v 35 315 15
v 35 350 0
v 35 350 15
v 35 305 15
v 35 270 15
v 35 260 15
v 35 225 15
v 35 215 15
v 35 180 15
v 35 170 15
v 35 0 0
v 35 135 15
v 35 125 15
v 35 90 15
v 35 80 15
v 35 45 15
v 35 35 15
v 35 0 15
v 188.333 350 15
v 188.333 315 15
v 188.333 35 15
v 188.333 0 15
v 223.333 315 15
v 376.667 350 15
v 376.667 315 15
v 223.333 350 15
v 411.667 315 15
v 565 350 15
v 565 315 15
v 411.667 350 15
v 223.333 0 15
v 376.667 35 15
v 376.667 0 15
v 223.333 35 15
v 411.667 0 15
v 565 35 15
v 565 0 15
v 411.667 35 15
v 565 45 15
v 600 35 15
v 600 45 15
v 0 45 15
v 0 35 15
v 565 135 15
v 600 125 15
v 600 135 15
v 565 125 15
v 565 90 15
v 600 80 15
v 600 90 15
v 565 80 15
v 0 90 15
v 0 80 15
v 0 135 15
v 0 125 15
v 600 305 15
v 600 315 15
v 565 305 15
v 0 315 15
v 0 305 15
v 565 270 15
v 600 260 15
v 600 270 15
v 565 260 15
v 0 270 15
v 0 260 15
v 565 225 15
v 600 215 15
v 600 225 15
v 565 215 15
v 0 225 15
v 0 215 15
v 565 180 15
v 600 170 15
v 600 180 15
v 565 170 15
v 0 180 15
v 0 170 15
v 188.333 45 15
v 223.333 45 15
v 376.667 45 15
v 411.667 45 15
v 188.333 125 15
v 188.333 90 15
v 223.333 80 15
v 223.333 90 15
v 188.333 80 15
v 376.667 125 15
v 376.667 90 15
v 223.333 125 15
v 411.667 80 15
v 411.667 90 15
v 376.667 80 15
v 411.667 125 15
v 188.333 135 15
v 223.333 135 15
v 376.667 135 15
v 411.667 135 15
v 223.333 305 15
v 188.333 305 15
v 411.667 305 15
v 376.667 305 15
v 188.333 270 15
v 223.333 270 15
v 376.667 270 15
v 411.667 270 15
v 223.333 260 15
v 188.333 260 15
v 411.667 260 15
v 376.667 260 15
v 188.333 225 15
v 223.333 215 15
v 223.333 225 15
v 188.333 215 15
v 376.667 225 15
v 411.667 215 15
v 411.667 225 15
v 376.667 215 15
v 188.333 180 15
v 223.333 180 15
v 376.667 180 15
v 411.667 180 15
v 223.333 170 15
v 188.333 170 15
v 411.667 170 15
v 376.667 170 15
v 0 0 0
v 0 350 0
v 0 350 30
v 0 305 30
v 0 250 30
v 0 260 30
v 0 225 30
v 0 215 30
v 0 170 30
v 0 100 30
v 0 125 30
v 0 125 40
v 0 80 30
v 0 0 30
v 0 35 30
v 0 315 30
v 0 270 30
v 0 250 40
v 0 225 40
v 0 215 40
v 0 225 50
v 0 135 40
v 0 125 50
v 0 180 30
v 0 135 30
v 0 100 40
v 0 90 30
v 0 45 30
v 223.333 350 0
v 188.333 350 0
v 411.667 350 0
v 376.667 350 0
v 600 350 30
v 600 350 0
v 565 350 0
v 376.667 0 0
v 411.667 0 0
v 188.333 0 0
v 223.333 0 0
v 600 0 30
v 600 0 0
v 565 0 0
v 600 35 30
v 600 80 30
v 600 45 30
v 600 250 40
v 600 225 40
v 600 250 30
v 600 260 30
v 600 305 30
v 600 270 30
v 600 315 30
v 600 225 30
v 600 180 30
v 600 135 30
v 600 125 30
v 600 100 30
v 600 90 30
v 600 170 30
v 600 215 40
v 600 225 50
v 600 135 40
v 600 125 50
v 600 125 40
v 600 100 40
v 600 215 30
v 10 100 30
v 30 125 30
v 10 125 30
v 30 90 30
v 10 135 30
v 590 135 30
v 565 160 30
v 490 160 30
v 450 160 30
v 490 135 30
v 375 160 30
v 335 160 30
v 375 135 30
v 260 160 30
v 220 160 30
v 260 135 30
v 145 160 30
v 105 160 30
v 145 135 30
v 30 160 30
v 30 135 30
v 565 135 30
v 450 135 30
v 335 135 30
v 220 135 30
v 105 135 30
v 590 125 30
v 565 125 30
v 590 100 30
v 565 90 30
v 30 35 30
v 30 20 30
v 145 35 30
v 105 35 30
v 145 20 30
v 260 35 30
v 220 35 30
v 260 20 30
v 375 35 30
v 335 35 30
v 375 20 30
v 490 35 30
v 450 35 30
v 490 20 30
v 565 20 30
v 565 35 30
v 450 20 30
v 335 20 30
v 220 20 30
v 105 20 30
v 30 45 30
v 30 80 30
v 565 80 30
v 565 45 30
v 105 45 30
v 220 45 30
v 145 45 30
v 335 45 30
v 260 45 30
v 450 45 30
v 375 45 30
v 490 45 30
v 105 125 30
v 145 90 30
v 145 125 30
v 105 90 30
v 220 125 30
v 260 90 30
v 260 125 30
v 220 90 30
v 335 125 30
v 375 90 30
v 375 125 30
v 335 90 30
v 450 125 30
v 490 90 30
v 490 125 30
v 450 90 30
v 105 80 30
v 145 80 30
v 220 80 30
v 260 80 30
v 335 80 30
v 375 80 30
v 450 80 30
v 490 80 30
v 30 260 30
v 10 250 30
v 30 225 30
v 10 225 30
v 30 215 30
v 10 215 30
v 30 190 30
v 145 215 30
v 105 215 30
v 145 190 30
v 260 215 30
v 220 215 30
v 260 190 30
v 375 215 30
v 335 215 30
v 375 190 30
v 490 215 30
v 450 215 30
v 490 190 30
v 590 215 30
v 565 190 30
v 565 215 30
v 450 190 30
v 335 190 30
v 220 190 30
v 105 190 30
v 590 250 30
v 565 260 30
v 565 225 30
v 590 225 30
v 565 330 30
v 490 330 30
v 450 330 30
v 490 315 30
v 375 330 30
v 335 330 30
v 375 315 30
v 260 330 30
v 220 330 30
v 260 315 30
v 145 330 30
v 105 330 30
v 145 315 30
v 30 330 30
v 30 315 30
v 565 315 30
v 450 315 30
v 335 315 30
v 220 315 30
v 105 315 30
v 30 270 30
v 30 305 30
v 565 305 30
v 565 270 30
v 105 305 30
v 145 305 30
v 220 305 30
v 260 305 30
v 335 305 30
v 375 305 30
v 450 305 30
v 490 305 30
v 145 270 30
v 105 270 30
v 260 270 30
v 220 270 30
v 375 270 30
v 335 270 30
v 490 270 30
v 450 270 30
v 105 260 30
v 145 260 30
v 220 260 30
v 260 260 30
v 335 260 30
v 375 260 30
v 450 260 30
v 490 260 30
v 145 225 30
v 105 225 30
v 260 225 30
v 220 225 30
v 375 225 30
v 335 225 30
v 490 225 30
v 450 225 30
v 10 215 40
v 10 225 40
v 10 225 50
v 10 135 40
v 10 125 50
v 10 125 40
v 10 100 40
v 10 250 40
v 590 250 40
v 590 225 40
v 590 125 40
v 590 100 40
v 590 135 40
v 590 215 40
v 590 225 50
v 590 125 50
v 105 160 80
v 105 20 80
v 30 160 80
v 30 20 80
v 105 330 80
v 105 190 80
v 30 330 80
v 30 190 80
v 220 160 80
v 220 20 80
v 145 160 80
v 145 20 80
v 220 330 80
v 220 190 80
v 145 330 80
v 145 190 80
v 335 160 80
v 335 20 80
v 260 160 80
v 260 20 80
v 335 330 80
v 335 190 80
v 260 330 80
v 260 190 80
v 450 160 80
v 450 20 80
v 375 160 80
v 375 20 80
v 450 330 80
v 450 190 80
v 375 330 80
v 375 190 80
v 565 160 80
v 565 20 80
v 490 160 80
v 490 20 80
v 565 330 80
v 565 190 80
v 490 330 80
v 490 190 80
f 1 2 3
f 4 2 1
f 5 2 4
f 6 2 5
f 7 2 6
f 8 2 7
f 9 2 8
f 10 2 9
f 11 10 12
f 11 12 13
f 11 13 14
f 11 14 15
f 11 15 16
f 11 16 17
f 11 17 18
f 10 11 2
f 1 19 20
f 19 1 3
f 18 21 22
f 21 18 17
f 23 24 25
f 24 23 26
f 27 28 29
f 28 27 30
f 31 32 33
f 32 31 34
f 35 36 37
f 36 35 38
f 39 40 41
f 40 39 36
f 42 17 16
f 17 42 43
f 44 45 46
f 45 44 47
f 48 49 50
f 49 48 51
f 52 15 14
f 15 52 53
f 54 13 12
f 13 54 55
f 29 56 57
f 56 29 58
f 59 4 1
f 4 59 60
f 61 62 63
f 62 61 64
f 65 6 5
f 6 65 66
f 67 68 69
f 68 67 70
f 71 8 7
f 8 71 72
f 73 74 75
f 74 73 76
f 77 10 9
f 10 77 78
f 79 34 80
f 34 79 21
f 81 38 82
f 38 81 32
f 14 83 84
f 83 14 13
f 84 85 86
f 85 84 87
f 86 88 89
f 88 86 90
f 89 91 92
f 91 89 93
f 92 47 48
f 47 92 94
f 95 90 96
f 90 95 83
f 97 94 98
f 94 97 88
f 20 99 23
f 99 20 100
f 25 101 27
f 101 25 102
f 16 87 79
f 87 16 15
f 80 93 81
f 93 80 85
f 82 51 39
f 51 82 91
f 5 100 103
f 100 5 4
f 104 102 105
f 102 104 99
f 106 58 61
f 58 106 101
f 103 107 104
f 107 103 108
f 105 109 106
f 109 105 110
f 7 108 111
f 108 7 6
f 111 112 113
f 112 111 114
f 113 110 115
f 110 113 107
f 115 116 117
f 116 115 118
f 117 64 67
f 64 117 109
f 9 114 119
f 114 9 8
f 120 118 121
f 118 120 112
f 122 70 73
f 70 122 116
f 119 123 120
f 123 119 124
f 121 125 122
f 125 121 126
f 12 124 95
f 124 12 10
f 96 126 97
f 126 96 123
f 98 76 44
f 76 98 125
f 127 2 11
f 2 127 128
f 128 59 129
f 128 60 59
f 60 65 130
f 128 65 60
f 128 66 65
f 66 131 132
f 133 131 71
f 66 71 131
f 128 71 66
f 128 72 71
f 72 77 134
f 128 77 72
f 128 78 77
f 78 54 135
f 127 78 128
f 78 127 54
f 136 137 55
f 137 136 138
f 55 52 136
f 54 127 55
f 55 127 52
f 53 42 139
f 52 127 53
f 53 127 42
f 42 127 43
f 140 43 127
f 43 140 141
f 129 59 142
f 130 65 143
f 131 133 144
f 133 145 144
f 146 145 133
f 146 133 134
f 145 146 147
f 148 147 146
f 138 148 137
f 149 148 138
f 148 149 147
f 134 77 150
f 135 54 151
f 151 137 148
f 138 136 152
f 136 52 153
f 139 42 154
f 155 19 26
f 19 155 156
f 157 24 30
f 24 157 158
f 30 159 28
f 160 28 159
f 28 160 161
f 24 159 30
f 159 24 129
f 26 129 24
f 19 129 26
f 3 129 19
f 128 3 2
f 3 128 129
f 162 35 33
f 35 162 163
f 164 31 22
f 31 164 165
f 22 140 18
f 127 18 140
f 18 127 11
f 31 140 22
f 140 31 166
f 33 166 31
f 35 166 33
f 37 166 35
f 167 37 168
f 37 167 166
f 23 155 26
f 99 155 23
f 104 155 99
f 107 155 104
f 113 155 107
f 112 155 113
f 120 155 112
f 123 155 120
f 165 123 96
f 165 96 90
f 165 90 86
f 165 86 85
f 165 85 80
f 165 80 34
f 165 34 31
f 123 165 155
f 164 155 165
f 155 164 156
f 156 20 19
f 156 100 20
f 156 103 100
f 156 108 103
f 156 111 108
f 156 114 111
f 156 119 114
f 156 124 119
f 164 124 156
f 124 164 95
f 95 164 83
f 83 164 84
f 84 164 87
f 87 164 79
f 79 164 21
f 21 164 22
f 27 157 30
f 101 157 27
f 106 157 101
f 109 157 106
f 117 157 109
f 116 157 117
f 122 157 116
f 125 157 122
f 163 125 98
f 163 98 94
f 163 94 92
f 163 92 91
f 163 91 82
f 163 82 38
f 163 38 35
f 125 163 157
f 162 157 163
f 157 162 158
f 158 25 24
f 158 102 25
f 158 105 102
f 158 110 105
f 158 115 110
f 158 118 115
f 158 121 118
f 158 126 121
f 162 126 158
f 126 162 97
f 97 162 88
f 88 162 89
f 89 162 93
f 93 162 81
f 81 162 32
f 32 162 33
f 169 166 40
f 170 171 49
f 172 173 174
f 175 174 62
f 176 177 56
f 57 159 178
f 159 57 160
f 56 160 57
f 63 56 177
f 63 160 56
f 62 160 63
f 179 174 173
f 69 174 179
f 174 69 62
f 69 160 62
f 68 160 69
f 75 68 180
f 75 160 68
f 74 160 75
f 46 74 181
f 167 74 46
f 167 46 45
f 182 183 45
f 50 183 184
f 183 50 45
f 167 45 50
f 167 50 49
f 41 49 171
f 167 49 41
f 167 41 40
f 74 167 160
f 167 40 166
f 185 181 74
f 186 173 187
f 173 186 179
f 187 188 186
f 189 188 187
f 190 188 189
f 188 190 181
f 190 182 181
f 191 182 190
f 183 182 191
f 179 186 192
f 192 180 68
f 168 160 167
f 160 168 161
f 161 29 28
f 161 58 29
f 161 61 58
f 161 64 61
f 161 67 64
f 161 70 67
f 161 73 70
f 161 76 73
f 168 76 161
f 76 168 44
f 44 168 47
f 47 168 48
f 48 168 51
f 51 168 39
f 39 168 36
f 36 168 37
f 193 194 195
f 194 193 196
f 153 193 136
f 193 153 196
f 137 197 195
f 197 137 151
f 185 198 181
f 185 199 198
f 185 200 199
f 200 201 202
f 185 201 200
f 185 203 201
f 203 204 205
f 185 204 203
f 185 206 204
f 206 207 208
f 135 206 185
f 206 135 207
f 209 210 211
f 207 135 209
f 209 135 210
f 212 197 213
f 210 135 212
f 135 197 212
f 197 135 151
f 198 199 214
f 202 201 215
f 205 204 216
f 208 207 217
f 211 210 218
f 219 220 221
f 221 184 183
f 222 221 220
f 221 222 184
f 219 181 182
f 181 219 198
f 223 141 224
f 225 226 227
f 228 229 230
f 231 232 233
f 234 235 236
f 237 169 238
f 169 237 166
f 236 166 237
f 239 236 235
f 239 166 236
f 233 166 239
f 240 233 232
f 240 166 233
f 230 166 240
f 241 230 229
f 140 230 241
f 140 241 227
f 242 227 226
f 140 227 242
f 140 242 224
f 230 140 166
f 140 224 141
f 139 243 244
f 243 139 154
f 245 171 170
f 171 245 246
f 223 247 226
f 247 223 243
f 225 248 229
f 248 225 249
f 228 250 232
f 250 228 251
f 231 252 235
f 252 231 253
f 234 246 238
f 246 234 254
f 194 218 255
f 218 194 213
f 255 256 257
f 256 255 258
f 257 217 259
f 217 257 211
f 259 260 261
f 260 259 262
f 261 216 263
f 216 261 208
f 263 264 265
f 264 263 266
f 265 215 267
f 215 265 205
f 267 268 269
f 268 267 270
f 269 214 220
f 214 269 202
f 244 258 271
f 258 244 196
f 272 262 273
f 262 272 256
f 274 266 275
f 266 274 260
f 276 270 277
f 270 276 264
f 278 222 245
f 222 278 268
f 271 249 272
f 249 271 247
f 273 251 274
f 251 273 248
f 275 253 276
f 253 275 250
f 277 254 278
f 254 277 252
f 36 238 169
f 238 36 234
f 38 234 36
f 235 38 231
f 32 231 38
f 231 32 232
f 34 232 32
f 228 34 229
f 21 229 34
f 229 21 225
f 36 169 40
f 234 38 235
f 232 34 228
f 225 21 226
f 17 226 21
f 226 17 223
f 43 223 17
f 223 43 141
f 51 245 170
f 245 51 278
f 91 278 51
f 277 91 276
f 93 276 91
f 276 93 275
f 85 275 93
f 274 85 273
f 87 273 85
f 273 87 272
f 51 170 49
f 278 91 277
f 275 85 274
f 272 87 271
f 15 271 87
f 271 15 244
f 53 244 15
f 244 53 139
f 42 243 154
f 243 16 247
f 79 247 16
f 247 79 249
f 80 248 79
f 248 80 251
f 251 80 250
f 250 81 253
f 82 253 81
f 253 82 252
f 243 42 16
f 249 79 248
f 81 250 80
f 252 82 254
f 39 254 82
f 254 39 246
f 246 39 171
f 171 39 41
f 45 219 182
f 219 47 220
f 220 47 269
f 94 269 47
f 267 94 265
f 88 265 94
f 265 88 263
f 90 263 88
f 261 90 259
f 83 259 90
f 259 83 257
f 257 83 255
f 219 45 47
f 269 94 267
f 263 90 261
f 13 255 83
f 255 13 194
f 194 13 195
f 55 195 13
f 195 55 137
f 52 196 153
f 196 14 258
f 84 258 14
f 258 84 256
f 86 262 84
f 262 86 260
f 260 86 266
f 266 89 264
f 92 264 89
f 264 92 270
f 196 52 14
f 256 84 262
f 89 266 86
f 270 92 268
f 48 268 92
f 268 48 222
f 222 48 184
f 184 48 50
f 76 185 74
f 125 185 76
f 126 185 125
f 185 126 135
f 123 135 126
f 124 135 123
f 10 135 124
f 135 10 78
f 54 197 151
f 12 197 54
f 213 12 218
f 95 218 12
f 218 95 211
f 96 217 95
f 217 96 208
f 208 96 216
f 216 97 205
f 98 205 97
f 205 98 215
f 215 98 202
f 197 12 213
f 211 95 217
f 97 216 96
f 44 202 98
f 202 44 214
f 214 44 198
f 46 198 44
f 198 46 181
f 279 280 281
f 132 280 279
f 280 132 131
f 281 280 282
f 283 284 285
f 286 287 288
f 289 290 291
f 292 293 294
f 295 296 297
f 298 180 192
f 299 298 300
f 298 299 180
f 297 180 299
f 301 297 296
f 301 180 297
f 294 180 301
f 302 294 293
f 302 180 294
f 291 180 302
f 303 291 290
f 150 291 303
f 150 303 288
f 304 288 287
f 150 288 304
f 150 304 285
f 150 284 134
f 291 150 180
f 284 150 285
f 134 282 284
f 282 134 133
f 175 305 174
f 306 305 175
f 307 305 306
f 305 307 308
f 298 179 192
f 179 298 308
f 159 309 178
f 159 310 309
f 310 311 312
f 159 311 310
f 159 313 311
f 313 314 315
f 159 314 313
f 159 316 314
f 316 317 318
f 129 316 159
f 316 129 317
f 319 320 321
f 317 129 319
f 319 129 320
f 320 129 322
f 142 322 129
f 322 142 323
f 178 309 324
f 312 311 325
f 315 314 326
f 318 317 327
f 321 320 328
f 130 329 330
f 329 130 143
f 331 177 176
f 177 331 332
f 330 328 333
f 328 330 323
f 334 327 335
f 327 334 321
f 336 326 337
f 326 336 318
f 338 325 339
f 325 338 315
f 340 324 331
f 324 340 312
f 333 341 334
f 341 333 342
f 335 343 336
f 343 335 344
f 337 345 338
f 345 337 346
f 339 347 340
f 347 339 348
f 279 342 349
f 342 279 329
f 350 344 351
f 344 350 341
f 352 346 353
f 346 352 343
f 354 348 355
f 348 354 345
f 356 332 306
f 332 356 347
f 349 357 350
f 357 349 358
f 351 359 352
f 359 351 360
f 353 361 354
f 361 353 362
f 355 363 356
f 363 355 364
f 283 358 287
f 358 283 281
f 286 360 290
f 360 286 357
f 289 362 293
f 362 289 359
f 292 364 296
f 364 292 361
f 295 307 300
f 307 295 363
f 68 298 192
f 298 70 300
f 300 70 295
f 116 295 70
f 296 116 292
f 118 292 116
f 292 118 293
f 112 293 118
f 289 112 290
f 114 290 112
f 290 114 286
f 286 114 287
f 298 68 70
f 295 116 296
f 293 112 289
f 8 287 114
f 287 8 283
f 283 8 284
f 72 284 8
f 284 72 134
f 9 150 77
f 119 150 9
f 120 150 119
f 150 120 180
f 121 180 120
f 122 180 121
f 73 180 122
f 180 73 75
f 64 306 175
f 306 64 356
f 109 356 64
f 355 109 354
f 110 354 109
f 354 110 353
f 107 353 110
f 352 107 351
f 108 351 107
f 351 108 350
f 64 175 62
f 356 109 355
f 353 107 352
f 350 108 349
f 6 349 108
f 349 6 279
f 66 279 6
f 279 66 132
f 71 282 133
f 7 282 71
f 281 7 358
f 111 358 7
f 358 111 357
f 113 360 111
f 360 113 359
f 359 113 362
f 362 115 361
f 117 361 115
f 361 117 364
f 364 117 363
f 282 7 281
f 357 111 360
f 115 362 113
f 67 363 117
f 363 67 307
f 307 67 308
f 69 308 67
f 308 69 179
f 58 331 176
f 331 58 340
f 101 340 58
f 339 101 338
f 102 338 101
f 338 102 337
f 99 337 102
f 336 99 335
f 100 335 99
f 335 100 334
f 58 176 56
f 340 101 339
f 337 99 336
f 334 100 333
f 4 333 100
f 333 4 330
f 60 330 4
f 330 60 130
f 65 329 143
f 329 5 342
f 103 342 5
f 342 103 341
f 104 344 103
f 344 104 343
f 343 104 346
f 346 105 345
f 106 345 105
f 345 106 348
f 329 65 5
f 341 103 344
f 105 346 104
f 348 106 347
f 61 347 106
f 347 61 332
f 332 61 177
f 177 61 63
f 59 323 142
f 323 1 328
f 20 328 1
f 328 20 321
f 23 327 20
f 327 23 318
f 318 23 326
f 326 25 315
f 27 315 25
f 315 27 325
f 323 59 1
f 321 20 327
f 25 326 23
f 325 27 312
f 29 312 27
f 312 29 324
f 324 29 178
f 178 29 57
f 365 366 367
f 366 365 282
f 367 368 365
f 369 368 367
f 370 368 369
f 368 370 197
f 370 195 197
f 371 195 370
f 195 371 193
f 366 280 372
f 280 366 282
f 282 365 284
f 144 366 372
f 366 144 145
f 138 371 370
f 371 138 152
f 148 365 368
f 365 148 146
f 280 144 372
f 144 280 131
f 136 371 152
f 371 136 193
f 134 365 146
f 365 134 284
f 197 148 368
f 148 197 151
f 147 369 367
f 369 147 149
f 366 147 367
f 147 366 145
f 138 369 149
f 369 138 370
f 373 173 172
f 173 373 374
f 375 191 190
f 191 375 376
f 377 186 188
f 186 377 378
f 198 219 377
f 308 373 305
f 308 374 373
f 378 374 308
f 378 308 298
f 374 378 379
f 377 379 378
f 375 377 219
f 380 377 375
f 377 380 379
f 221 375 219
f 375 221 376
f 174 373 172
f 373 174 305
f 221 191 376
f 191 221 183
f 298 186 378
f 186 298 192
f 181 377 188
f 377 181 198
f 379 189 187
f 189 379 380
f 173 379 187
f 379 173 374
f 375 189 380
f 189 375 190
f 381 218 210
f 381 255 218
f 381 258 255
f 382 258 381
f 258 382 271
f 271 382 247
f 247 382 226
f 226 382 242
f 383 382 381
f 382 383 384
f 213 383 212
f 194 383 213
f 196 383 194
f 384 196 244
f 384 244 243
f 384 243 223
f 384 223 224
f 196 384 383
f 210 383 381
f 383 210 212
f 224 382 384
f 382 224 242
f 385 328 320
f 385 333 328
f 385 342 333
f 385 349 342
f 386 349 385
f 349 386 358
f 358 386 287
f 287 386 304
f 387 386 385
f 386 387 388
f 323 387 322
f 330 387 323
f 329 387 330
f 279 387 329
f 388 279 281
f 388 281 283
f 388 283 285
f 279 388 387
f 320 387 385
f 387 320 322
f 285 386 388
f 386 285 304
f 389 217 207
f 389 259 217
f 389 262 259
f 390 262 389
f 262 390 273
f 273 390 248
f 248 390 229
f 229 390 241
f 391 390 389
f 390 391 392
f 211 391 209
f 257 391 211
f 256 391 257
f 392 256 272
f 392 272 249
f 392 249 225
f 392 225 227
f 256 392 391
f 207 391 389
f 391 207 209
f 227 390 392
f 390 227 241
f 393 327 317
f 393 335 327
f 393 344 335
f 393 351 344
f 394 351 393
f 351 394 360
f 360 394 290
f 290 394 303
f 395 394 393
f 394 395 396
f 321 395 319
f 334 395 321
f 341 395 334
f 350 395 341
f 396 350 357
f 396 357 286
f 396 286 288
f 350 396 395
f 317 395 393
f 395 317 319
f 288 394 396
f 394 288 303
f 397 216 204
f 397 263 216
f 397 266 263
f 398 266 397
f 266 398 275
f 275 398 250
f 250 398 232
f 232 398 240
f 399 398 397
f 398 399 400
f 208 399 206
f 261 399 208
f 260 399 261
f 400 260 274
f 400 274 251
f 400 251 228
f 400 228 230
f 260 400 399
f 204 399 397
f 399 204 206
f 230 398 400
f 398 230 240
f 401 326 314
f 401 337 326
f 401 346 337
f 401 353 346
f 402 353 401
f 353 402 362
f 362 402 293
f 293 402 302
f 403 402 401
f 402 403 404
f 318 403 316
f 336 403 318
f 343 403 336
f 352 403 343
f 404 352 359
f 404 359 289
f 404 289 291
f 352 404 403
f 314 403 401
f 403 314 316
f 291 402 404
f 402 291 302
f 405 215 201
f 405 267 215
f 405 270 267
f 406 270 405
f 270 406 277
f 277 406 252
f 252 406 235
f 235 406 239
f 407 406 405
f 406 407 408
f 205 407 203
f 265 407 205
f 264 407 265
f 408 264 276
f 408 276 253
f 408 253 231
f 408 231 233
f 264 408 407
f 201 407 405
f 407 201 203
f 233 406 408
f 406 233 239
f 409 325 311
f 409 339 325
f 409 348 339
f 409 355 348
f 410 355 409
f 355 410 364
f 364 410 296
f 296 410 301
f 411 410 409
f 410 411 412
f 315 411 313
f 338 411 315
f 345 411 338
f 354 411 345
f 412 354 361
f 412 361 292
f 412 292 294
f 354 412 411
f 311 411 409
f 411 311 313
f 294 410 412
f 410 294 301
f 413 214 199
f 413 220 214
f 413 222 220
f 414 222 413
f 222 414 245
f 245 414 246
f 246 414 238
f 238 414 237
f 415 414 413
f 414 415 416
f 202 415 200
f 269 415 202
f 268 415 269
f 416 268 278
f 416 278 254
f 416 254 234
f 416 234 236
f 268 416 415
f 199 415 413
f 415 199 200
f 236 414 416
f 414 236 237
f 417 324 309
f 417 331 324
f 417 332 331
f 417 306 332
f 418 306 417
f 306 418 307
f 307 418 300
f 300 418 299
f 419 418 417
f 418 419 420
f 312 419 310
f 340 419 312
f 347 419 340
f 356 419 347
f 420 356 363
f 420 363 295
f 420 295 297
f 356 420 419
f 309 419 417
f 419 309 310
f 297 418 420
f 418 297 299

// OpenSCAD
bossW = 75;
bossH = 140;
bossD = 50;
space = 40;
slatH = 35;
hspace = 20;
wspace = 30;
wStep = bossW+space;
hStep = bossH + hspace;

module pedals(boardheight) {
    module bossSizePedal(bossW=75, bossH=140, bossD=50) {
        cube([bossW, bossH, bossD]);    
    }

    shiftV = boardheight - bossH - hspace;
    for(i = [0:1:4]){
        translate([i*wStep + wspace, hspace, 30])bossSizePedal();    
        translate([i*wStep + wspace, shiftV, 30])bossSizePedal();
    }
}

module pedalboard(boardwidth, boardheight, boarddepth, nHslats=8, nVslats=4) {
    // VERTICAL SLATS
    shiftH = (boardwidth - slatH) / 3;
    for(i = [0:1:nVslats-1]) {
        translate([i*shiftH, 0, 0])cube([slatH, boardheight, 15]);
    }
    // HORIZONTAL SLATS
    shiftV = (boardheight - slatH) / 7;
    for(i = [0:1:nHslats-1]){
        translate([0,i*shiftV, boarddepth/2])cube([boardwidth, slatH, 15]);
    }    
}

module handles(boardwidth, boardheight, boarddepth) {
    handlewidth=10;
    handledepth=20;
    handleheight=150;
    handleheight2=handleheight-50;
    
    module handle() {
        difference(){
            cube([handlewidth,handleheight,handledepth/2]);
            translate([-1,(handleheight2-30)/2,-1])cube([handlewidth+2,80,(handledepth/2)+1]);
        }
        translate([0,25,handledepth/2])cube([handlewidth,handleheight2,handledepth/2]);
    
    }
    
    translate([0,100,boarddepth])handle();
    translate([boardwidth-handlewidth,100,boarddepth])handle();
}

color([0.85,0.7,0.0])pedalboard(600, 350, 30);
color([0.2,0.2,0.2])handles(600, 350, 30);
color([0.9,0.9,0.9])pedals(350);
